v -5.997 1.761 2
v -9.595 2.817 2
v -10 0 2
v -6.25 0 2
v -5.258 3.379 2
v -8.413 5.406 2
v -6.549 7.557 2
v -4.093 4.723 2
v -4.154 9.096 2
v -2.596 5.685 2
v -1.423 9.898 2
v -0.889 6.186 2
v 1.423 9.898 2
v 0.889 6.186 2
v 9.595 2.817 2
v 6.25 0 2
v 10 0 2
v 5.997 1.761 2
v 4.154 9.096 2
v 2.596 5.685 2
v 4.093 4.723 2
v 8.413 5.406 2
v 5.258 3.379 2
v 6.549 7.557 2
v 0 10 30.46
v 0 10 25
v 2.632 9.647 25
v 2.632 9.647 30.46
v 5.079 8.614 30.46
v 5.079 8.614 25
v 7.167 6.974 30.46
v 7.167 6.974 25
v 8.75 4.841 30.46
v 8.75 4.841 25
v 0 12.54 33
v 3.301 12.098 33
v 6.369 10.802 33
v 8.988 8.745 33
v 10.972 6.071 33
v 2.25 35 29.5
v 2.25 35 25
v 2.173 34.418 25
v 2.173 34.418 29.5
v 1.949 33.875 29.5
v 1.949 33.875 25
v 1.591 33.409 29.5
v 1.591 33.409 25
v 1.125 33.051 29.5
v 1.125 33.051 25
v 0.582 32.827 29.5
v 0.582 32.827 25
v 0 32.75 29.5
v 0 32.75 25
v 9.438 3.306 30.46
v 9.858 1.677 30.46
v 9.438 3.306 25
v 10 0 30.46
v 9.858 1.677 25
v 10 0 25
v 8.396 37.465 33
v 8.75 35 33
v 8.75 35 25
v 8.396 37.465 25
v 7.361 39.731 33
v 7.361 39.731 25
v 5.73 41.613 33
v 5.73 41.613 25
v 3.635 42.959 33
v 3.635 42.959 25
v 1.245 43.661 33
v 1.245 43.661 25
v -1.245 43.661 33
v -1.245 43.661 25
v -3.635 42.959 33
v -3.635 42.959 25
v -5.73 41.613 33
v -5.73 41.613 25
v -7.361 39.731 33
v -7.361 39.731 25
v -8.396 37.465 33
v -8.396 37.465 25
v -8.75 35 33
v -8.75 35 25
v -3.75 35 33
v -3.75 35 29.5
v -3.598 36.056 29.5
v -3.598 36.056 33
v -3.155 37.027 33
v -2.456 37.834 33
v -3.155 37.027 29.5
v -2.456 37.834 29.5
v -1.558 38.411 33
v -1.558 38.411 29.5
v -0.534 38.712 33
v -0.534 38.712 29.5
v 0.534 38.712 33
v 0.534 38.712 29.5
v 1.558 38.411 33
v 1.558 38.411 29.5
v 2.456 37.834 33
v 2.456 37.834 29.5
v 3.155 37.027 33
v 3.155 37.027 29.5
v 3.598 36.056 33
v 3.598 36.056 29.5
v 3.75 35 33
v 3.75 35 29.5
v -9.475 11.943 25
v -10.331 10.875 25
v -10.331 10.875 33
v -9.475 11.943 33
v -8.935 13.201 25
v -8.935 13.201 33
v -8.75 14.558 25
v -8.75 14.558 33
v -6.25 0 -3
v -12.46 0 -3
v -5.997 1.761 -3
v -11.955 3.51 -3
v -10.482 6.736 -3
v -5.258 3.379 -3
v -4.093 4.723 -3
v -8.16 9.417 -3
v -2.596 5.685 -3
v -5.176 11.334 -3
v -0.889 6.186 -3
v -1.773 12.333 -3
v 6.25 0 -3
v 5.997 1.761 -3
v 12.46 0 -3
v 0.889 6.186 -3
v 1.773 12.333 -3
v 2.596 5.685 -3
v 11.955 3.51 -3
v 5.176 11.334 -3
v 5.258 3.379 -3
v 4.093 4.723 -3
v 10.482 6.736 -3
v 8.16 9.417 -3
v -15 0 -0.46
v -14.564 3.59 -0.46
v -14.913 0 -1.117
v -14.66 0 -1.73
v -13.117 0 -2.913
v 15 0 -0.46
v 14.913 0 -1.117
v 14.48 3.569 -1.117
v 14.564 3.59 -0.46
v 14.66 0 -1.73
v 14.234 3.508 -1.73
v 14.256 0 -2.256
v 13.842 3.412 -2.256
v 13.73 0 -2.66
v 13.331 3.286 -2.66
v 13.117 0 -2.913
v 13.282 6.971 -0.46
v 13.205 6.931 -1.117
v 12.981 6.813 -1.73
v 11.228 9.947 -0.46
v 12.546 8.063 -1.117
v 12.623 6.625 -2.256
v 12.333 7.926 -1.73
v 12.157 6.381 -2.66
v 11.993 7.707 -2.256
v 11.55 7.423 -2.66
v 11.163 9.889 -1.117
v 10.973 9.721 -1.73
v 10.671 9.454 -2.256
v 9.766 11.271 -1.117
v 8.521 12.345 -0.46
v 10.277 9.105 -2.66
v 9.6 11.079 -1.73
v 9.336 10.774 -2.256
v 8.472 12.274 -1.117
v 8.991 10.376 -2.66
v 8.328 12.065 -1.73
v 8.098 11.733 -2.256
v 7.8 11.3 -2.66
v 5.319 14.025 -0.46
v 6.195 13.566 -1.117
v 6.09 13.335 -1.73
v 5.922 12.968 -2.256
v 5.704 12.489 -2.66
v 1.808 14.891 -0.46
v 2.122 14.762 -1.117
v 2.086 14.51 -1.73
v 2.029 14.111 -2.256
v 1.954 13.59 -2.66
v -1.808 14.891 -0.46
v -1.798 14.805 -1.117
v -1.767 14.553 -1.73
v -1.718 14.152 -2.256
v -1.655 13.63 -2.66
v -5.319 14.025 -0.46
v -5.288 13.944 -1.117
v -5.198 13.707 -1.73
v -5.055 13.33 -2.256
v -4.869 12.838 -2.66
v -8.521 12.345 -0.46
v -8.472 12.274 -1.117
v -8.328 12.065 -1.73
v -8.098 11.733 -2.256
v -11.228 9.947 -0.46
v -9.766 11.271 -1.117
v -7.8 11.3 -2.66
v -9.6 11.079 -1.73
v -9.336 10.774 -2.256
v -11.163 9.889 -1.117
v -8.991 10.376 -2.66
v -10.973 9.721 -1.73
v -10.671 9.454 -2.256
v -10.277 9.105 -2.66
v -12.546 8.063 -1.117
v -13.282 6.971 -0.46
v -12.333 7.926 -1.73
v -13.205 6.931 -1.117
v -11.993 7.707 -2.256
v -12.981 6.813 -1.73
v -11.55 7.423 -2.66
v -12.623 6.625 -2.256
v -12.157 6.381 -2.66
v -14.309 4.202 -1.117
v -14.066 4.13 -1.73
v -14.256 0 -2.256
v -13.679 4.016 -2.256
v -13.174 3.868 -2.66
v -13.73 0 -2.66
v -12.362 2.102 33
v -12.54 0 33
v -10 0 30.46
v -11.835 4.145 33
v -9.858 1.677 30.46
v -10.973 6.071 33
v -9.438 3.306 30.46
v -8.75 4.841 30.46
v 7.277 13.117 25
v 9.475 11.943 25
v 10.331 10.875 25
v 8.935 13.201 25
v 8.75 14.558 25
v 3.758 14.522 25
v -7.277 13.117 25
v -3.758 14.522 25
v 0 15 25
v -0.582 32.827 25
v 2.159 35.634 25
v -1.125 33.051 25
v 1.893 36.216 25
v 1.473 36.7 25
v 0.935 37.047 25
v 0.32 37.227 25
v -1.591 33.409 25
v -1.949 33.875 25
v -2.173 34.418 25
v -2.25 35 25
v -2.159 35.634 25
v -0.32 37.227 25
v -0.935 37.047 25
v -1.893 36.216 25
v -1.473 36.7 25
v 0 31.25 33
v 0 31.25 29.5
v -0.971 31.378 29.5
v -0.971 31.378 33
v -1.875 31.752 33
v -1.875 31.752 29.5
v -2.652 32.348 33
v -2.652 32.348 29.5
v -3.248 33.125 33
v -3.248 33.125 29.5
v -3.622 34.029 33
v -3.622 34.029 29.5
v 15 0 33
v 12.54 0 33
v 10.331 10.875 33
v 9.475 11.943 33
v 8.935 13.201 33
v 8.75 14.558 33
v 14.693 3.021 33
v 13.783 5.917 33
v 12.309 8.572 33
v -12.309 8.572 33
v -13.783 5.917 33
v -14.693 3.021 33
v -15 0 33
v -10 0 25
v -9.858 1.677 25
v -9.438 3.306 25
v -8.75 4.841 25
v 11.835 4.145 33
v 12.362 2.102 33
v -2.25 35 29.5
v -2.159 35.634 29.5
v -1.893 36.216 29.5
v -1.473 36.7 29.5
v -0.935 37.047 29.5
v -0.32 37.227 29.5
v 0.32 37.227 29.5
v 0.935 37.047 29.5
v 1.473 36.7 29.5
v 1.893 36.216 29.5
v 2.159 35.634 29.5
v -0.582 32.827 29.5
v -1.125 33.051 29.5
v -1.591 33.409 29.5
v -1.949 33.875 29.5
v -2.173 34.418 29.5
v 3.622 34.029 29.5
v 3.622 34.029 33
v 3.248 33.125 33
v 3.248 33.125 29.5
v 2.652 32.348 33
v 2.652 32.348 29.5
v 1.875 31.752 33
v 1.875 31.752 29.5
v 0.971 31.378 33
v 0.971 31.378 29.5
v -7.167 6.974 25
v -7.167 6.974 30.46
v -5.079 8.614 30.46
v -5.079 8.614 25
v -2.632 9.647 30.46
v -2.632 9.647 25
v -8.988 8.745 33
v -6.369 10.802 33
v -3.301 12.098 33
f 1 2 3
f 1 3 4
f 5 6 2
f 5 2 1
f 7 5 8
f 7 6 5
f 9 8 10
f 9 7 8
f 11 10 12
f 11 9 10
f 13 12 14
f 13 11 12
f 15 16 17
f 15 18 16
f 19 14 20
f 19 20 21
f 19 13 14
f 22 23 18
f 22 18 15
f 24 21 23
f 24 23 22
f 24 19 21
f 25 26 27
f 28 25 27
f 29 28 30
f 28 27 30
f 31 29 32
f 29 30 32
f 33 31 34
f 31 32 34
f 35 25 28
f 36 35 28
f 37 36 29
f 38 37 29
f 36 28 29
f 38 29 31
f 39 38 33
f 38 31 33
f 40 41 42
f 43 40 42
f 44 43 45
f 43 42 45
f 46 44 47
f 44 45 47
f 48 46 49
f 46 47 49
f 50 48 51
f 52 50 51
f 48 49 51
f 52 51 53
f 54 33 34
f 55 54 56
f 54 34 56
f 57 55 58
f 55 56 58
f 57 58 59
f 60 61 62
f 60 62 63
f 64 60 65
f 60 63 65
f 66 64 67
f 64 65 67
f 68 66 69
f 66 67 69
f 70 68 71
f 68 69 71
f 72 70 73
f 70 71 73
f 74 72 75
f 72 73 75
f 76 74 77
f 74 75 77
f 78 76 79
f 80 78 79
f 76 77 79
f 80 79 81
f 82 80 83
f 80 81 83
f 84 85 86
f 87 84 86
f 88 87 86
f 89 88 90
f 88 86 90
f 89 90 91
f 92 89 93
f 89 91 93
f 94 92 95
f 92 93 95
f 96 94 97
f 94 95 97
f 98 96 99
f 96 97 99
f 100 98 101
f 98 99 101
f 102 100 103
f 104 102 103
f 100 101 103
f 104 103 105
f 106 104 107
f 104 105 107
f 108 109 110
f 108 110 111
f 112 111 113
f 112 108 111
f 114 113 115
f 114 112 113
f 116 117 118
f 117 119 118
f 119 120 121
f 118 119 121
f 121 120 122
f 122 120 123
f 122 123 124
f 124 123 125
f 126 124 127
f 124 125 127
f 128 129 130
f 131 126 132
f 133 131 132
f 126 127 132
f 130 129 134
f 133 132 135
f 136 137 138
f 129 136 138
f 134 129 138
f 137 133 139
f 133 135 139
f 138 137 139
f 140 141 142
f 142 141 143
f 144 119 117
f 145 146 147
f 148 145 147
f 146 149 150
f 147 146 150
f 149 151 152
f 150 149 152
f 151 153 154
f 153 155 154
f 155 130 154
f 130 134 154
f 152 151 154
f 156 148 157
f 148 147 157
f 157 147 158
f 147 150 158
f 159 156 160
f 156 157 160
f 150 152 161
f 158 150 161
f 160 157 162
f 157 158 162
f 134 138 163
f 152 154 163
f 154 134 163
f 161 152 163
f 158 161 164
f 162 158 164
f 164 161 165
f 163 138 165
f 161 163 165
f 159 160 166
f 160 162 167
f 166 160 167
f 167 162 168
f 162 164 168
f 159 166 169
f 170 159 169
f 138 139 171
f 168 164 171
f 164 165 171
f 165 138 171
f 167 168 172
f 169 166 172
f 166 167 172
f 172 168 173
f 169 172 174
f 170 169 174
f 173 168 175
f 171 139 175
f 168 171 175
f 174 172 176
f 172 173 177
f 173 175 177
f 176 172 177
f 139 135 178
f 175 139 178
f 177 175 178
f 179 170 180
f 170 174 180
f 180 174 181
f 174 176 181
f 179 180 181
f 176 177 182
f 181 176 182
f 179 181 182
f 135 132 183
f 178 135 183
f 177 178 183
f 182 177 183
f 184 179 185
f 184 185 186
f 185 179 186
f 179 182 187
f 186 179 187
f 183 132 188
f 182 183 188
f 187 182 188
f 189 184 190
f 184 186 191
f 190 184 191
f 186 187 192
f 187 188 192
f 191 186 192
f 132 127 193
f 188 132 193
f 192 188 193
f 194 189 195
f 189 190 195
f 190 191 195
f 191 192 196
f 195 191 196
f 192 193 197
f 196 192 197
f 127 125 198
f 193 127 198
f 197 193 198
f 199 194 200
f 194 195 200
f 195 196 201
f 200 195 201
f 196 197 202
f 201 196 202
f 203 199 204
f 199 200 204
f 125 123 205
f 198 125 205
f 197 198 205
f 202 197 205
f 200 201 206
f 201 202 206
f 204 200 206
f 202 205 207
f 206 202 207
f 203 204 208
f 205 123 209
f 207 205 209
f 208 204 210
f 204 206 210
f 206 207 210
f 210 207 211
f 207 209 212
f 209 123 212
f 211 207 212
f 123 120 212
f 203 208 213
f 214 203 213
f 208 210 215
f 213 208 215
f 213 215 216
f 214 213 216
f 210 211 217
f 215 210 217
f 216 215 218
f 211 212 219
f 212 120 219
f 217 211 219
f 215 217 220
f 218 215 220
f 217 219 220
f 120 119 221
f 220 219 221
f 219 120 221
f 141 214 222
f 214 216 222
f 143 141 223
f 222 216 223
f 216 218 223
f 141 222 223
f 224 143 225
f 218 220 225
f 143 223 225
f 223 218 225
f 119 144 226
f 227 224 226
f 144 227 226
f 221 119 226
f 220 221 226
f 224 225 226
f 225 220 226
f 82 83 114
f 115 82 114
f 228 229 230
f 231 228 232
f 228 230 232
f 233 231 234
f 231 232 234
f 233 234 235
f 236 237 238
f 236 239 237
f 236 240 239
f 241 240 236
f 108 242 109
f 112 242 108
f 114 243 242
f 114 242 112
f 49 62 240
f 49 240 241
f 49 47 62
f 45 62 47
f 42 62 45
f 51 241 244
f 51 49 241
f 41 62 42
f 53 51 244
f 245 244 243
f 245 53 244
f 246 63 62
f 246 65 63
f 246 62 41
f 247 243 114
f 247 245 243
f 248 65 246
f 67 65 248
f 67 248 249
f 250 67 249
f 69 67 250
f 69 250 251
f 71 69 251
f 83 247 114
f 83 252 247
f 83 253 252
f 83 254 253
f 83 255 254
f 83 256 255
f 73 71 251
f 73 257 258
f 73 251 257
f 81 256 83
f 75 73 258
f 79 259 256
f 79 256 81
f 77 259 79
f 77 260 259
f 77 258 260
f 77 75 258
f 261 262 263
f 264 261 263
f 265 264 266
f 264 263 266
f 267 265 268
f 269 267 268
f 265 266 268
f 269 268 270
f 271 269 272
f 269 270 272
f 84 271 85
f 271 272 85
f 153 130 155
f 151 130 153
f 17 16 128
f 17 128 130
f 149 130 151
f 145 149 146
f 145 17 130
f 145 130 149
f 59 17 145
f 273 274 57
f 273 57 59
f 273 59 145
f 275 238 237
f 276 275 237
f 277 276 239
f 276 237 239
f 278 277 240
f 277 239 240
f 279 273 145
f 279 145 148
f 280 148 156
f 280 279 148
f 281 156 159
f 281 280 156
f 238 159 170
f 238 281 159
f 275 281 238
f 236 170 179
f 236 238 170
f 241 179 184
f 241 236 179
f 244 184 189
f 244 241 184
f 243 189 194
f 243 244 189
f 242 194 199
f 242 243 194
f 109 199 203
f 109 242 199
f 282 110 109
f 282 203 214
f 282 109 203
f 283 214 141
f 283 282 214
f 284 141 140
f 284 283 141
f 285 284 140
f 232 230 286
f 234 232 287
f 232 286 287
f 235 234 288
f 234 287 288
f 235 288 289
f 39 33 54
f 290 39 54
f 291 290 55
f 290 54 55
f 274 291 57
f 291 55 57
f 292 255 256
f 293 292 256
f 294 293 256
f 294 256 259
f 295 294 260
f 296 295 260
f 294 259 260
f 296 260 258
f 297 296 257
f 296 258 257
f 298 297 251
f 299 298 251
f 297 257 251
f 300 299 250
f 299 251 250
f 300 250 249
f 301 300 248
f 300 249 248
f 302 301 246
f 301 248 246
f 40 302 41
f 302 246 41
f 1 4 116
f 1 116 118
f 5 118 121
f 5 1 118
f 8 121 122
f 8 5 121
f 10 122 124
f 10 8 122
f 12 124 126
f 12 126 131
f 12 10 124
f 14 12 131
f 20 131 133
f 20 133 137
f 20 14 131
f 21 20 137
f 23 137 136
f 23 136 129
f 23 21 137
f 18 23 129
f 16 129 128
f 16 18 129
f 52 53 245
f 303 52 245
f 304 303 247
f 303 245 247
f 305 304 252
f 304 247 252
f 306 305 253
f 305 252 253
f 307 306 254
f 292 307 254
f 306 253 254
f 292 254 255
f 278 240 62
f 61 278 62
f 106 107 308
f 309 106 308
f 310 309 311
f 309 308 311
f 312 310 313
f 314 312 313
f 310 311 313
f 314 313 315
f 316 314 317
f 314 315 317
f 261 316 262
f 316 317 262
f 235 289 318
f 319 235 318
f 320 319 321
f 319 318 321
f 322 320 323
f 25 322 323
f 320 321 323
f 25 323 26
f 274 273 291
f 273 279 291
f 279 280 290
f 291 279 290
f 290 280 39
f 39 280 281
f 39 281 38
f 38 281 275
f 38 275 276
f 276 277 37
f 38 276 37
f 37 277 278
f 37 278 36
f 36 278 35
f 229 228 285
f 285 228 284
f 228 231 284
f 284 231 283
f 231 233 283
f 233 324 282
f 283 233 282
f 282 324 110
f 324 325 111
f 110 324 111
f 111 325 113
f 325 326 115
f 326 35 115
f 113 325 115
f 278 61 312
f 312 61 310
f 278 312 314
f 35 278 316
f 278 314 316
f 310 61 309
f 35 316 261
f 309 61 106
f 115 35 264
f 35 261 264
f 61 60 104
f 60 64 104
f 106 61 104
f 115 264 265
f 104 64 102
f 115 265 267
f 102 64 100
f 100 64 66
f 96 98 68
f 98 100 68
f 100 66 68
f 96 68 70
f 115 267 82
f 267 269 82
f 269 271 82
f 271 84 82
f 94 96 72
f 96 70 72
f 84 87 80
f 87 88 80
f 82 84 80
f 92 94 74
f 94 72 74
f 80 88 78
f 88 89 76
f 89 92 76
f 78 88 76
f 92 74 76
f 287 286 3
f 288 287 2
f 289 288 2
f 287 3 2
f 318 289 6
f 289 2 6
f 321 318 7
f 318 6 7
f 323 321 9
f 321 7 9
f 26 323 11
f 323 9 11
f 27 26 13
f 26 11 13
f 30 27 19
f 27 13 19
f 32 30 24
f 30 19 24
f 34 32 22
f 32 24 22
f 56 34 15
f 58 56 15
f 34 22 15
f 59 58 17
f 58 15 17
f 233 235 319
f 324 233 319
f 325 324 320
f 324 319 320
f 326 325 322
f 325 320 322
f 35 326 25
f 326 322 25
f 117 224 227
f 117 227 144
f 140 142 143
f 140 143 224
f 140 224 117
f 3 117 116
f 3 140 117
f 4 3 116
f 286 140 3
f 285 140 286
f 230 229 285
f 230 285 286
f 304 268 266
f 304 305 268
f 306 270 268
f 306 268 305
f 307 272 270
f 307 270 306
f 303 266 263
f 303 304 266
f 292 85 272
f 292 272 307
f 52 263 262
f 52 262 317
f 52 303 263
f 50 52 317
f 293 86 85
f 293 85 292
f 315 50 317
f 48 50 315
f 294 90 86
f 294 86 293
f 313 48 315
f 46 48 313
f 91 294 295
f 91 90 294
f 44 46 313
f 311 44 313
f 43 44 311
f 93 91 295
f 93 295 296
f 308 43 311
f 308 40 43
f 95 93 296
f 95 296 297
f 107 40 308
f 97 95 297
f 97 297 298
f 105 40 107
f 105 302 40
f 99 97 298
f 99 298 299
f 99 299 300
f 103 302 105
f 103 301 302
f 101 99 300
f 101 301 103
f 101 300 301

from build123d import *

# Parameters (mm, degrees)
F1_DEPTH    = 2
F2_DEPTH    = 25
F4_DEPTH    = 8
F5_DEPTH    = 4.5
F6_T1_DEPTH = 8
F7_DEPTH    = 3
F8_R        = 2.54
F9_SIZE     = 2.54


# Not quite as in the source:
# - a fillet or chamfer that OpenCascade refuses, or shapes differently, is made with other operations: its cross-section is extruded or revolved along the edge and cut away or added


with BuildPart() as f1:
    # F0 (on Top) → F1 (new body)
    with BuildSketch(Plane.XY):
        with BuildLine():
            Line((6.25, 0), (10, 0))
            ThreePointArc((10, 0), (0, 10), (-10, 0))
            Line((-10, 0), (-6.25, 0))
            ThreePointArc((-6.25, 0), (0, 6.25), (6.25, 0))
        make_face()
    extrude(amount=F1_DEPTH)

    # F0 (on Top) → F2 (join)
    with BuildSketch(Plane.XY):
        with BuildLine():
            ThreePointArc((-10, 0), (0, 10), (10, 0))
            Line((10, 0), (15, 0))
            ThreePointArc((15, 0), (0, 15), (-15, 0))
            Line((-15, 0), (-10, 0))
        make_face()
    extrude(amount=F2_DEPTH)

    # F3 (on face) → F4 (join)
    with BuildSketch(Plane.XY.offset(25)):
        with BuildLine():
            ThreePointArc((-8.75, 12.183492931), (-4.5960638613, 14.2785222268), (0, 15))
            Line((0, 15), (0, 26.25))
            ThreePointArc((0, 26.25), (-6.1871843354, 28.8128156646), (-8.75, 35))
            Line((-8.75, 35), (-8.75, 12.183492931))
        make_face()
        with BuildLine():
            Line((0, 26.25), (0, 15))
            ThreePointArc((0, 15), (4.5960638613, 14.2785222268), (8.75, 12.183492931))
            Line((8.75, 12.183492931), (8.75, 35))
            ThreePointArc((8.75, 35), (6.1871843354, 28.8128156646), (0, 26.25))
        make_face()
        with BuildLine():
            ThreePointArc((8.75, 35), (0, 43.75), (-8.75, 35))
            Line((-8.75, 35), (-3.75, 35))
            ThreePointArc((-3.75, 35), (0, 38.75), (3.75, 35))
            Line((3.75, 35), (8.75, 35))
        make_face()
        with BuildLine():
            Line((8.75, 12.183492931), (8.75, 4.8412291828))
            ThreePointArc((8.75, 4.8412291828), (9.6824583655, 2.5), (10, 0))
            Line((10, 0), (15, 0))
            ThreePointArc((15, 0), (13.346347815, 6.8465319688), (8.75, 12.183492931))
        make_face()
        with BuildLine():
            ThreePointArc((-10, 0), (-9.6824583655, 2.5), (-8.75, 4.8412291828))
            Line((-8.75, 4.8412291828), (-8.75, 12.183492931))
            ThreePointArc((-8.75, 12.183492931), (-13.346347815, 6.8465319688), (-15, 0))
            Line((-15, 0), (-10, 0))
        make_face()
        with BuildLine():
            Line((0, 15), (0, 10))
            ThreePointArc((0, 10), (5.0787650158, 8.6142989218), (8.75, 4.8412291828))
            Line((8.75, 4.8412291828), (8.75, 12.183492931))
            ThreePointArc((8.75, 12.183492931), (4.5960638613, 14.2785222268), (0, 15))
        make_face()
        with BuildLine():
            ThreePointArc((-8.75, 4.8412291828), (-5.0787650158, 8.6142989218), (0, 10))
            Line((0, 10), (0, 15))
            ThreePointArc((0, 15), (-4.5960638613, 14.2785222268), (-8.75, 12.183492931))
            Line((-8.75, 12.183492931), (-8.75, 4.8412291828))
        make_face()
        with BuildLine():
            ThreePointArc((-8.75, 35), (-6.1871843354, 28.8128156646), (0, 26.25))
            Line((0, 26.25), (0, 31.25))
            ThreePointArc((0, 31.25), (-2.6516504294, 32.3483495706), (-3.75, 35))
            Line((-3.75, 35), (-8.75, 35))
        make_face()
        with BuildLine():
            Line((0, 31.25), (0, 26.25))
            ThreePointArc((0, 26.25), (6.1871843354, 28.8128156646), (8.75, 35))
            Line((8.75, 35), (3.75, 35))
            ThreePointArc((3.75, 35), (2.6516504294, 32.3483495706), (0, 31.25))
        make_face()
    extrude(amount=F4_DEPTH)

    # F3 (on face) → F5 (join)
    with BuildSketch(Plane.XY.offset(25)):
        with BuildLine():
            ThreePointArc((3.75, 35), (0, 38.75), (-3.75, 35))
            Line((-3.75, 35), (-2.25, 35))
            ThreePointArc((-2.25, 35), (0, 37.25), (2.25, 35))
            Line((2.25, 35), (3.75, 35))
        make_face()
        with BuildLine():
            ThreePointArc((-3.75, 35), (-2.6516504294, 32.3483495706), (0, 31.25))
            Line((0, 31.25), (0, 32.75))
            ThreePointArc((0, 32.75), (-1.5909902577, 33.4090097423), (-2.25, 35))
            Line((-2.25, 35), (-3.75, 35))
        make_face()
        with BuildLine():
            Line((0, 32.75), (0, 31.25))
            ThreePointArc((0, 31.25), (2.6516504294, 32.3483495706), (3.75, 35))
            Line((3.75, 35), (2.25, 35))
            ThreePointArc((2.25, 35), (1.5909902577, 33.4090097423), (0, 32.75))
        make_face()
    extrude(amount=F5_DEPTH)

    # F6: fillet of radius 5.08 on 2 edges, made by hand

    # F6_s2 → F6_t1 (join)
    with BuildSketch(Plane.XY.offset(25)):
        with BuildLine():
            ThreePointArc((-10.3311752988, 10.8750548019), (-9.1620009917, 12.5540311317), (-8.75, 14.5580733615))
            Line((-8.75, 14.5580733615), (-8.75, 12.183492931))
            ThreePointArc((-8.75, 12.183492931), (-9.5629919628, 11.5563482433), (-10.3311752988, 10.8750548019))
        make_face()
        with BuildLine():
            ThreePointArc((10.3311752988, 10.8750548019), (9.1620009917, 12.5540311317), (8.75, 14.5580733615))
            Line((8.75, 14.5580733615), (8.75, 12.183492931))
            ThreePointArc((8.75, 12.183492931), (9.5629919628, 11.5563482433), (10.3311752988, 10.8750548019))
        make_face()
    extrude(amount=F6_T1_DEPTH)

    # F7 (add): a face of the model
    f7_faces = [f1.faces().sort_by_distance(p)[0] for p in [
        (0, 7.1463690133, 0),
    ]]
    extrude(f7_faces, amount=F7_DEPTH)

    # F8
    f8_edges = [f1.edges().sort_by_distance(p)[0] for p in [
        (0, 15, -3),
    ]]
    fillet(f8_edges, radius=F8_R)

    # F9
    f9_edges = [f1.edges().sort_by_distance(p)[0] for p in [
        (0, 10, 33),
    ]]
    chamfer(f9_edges, length=F9_SIZE)


solid = f1.part
